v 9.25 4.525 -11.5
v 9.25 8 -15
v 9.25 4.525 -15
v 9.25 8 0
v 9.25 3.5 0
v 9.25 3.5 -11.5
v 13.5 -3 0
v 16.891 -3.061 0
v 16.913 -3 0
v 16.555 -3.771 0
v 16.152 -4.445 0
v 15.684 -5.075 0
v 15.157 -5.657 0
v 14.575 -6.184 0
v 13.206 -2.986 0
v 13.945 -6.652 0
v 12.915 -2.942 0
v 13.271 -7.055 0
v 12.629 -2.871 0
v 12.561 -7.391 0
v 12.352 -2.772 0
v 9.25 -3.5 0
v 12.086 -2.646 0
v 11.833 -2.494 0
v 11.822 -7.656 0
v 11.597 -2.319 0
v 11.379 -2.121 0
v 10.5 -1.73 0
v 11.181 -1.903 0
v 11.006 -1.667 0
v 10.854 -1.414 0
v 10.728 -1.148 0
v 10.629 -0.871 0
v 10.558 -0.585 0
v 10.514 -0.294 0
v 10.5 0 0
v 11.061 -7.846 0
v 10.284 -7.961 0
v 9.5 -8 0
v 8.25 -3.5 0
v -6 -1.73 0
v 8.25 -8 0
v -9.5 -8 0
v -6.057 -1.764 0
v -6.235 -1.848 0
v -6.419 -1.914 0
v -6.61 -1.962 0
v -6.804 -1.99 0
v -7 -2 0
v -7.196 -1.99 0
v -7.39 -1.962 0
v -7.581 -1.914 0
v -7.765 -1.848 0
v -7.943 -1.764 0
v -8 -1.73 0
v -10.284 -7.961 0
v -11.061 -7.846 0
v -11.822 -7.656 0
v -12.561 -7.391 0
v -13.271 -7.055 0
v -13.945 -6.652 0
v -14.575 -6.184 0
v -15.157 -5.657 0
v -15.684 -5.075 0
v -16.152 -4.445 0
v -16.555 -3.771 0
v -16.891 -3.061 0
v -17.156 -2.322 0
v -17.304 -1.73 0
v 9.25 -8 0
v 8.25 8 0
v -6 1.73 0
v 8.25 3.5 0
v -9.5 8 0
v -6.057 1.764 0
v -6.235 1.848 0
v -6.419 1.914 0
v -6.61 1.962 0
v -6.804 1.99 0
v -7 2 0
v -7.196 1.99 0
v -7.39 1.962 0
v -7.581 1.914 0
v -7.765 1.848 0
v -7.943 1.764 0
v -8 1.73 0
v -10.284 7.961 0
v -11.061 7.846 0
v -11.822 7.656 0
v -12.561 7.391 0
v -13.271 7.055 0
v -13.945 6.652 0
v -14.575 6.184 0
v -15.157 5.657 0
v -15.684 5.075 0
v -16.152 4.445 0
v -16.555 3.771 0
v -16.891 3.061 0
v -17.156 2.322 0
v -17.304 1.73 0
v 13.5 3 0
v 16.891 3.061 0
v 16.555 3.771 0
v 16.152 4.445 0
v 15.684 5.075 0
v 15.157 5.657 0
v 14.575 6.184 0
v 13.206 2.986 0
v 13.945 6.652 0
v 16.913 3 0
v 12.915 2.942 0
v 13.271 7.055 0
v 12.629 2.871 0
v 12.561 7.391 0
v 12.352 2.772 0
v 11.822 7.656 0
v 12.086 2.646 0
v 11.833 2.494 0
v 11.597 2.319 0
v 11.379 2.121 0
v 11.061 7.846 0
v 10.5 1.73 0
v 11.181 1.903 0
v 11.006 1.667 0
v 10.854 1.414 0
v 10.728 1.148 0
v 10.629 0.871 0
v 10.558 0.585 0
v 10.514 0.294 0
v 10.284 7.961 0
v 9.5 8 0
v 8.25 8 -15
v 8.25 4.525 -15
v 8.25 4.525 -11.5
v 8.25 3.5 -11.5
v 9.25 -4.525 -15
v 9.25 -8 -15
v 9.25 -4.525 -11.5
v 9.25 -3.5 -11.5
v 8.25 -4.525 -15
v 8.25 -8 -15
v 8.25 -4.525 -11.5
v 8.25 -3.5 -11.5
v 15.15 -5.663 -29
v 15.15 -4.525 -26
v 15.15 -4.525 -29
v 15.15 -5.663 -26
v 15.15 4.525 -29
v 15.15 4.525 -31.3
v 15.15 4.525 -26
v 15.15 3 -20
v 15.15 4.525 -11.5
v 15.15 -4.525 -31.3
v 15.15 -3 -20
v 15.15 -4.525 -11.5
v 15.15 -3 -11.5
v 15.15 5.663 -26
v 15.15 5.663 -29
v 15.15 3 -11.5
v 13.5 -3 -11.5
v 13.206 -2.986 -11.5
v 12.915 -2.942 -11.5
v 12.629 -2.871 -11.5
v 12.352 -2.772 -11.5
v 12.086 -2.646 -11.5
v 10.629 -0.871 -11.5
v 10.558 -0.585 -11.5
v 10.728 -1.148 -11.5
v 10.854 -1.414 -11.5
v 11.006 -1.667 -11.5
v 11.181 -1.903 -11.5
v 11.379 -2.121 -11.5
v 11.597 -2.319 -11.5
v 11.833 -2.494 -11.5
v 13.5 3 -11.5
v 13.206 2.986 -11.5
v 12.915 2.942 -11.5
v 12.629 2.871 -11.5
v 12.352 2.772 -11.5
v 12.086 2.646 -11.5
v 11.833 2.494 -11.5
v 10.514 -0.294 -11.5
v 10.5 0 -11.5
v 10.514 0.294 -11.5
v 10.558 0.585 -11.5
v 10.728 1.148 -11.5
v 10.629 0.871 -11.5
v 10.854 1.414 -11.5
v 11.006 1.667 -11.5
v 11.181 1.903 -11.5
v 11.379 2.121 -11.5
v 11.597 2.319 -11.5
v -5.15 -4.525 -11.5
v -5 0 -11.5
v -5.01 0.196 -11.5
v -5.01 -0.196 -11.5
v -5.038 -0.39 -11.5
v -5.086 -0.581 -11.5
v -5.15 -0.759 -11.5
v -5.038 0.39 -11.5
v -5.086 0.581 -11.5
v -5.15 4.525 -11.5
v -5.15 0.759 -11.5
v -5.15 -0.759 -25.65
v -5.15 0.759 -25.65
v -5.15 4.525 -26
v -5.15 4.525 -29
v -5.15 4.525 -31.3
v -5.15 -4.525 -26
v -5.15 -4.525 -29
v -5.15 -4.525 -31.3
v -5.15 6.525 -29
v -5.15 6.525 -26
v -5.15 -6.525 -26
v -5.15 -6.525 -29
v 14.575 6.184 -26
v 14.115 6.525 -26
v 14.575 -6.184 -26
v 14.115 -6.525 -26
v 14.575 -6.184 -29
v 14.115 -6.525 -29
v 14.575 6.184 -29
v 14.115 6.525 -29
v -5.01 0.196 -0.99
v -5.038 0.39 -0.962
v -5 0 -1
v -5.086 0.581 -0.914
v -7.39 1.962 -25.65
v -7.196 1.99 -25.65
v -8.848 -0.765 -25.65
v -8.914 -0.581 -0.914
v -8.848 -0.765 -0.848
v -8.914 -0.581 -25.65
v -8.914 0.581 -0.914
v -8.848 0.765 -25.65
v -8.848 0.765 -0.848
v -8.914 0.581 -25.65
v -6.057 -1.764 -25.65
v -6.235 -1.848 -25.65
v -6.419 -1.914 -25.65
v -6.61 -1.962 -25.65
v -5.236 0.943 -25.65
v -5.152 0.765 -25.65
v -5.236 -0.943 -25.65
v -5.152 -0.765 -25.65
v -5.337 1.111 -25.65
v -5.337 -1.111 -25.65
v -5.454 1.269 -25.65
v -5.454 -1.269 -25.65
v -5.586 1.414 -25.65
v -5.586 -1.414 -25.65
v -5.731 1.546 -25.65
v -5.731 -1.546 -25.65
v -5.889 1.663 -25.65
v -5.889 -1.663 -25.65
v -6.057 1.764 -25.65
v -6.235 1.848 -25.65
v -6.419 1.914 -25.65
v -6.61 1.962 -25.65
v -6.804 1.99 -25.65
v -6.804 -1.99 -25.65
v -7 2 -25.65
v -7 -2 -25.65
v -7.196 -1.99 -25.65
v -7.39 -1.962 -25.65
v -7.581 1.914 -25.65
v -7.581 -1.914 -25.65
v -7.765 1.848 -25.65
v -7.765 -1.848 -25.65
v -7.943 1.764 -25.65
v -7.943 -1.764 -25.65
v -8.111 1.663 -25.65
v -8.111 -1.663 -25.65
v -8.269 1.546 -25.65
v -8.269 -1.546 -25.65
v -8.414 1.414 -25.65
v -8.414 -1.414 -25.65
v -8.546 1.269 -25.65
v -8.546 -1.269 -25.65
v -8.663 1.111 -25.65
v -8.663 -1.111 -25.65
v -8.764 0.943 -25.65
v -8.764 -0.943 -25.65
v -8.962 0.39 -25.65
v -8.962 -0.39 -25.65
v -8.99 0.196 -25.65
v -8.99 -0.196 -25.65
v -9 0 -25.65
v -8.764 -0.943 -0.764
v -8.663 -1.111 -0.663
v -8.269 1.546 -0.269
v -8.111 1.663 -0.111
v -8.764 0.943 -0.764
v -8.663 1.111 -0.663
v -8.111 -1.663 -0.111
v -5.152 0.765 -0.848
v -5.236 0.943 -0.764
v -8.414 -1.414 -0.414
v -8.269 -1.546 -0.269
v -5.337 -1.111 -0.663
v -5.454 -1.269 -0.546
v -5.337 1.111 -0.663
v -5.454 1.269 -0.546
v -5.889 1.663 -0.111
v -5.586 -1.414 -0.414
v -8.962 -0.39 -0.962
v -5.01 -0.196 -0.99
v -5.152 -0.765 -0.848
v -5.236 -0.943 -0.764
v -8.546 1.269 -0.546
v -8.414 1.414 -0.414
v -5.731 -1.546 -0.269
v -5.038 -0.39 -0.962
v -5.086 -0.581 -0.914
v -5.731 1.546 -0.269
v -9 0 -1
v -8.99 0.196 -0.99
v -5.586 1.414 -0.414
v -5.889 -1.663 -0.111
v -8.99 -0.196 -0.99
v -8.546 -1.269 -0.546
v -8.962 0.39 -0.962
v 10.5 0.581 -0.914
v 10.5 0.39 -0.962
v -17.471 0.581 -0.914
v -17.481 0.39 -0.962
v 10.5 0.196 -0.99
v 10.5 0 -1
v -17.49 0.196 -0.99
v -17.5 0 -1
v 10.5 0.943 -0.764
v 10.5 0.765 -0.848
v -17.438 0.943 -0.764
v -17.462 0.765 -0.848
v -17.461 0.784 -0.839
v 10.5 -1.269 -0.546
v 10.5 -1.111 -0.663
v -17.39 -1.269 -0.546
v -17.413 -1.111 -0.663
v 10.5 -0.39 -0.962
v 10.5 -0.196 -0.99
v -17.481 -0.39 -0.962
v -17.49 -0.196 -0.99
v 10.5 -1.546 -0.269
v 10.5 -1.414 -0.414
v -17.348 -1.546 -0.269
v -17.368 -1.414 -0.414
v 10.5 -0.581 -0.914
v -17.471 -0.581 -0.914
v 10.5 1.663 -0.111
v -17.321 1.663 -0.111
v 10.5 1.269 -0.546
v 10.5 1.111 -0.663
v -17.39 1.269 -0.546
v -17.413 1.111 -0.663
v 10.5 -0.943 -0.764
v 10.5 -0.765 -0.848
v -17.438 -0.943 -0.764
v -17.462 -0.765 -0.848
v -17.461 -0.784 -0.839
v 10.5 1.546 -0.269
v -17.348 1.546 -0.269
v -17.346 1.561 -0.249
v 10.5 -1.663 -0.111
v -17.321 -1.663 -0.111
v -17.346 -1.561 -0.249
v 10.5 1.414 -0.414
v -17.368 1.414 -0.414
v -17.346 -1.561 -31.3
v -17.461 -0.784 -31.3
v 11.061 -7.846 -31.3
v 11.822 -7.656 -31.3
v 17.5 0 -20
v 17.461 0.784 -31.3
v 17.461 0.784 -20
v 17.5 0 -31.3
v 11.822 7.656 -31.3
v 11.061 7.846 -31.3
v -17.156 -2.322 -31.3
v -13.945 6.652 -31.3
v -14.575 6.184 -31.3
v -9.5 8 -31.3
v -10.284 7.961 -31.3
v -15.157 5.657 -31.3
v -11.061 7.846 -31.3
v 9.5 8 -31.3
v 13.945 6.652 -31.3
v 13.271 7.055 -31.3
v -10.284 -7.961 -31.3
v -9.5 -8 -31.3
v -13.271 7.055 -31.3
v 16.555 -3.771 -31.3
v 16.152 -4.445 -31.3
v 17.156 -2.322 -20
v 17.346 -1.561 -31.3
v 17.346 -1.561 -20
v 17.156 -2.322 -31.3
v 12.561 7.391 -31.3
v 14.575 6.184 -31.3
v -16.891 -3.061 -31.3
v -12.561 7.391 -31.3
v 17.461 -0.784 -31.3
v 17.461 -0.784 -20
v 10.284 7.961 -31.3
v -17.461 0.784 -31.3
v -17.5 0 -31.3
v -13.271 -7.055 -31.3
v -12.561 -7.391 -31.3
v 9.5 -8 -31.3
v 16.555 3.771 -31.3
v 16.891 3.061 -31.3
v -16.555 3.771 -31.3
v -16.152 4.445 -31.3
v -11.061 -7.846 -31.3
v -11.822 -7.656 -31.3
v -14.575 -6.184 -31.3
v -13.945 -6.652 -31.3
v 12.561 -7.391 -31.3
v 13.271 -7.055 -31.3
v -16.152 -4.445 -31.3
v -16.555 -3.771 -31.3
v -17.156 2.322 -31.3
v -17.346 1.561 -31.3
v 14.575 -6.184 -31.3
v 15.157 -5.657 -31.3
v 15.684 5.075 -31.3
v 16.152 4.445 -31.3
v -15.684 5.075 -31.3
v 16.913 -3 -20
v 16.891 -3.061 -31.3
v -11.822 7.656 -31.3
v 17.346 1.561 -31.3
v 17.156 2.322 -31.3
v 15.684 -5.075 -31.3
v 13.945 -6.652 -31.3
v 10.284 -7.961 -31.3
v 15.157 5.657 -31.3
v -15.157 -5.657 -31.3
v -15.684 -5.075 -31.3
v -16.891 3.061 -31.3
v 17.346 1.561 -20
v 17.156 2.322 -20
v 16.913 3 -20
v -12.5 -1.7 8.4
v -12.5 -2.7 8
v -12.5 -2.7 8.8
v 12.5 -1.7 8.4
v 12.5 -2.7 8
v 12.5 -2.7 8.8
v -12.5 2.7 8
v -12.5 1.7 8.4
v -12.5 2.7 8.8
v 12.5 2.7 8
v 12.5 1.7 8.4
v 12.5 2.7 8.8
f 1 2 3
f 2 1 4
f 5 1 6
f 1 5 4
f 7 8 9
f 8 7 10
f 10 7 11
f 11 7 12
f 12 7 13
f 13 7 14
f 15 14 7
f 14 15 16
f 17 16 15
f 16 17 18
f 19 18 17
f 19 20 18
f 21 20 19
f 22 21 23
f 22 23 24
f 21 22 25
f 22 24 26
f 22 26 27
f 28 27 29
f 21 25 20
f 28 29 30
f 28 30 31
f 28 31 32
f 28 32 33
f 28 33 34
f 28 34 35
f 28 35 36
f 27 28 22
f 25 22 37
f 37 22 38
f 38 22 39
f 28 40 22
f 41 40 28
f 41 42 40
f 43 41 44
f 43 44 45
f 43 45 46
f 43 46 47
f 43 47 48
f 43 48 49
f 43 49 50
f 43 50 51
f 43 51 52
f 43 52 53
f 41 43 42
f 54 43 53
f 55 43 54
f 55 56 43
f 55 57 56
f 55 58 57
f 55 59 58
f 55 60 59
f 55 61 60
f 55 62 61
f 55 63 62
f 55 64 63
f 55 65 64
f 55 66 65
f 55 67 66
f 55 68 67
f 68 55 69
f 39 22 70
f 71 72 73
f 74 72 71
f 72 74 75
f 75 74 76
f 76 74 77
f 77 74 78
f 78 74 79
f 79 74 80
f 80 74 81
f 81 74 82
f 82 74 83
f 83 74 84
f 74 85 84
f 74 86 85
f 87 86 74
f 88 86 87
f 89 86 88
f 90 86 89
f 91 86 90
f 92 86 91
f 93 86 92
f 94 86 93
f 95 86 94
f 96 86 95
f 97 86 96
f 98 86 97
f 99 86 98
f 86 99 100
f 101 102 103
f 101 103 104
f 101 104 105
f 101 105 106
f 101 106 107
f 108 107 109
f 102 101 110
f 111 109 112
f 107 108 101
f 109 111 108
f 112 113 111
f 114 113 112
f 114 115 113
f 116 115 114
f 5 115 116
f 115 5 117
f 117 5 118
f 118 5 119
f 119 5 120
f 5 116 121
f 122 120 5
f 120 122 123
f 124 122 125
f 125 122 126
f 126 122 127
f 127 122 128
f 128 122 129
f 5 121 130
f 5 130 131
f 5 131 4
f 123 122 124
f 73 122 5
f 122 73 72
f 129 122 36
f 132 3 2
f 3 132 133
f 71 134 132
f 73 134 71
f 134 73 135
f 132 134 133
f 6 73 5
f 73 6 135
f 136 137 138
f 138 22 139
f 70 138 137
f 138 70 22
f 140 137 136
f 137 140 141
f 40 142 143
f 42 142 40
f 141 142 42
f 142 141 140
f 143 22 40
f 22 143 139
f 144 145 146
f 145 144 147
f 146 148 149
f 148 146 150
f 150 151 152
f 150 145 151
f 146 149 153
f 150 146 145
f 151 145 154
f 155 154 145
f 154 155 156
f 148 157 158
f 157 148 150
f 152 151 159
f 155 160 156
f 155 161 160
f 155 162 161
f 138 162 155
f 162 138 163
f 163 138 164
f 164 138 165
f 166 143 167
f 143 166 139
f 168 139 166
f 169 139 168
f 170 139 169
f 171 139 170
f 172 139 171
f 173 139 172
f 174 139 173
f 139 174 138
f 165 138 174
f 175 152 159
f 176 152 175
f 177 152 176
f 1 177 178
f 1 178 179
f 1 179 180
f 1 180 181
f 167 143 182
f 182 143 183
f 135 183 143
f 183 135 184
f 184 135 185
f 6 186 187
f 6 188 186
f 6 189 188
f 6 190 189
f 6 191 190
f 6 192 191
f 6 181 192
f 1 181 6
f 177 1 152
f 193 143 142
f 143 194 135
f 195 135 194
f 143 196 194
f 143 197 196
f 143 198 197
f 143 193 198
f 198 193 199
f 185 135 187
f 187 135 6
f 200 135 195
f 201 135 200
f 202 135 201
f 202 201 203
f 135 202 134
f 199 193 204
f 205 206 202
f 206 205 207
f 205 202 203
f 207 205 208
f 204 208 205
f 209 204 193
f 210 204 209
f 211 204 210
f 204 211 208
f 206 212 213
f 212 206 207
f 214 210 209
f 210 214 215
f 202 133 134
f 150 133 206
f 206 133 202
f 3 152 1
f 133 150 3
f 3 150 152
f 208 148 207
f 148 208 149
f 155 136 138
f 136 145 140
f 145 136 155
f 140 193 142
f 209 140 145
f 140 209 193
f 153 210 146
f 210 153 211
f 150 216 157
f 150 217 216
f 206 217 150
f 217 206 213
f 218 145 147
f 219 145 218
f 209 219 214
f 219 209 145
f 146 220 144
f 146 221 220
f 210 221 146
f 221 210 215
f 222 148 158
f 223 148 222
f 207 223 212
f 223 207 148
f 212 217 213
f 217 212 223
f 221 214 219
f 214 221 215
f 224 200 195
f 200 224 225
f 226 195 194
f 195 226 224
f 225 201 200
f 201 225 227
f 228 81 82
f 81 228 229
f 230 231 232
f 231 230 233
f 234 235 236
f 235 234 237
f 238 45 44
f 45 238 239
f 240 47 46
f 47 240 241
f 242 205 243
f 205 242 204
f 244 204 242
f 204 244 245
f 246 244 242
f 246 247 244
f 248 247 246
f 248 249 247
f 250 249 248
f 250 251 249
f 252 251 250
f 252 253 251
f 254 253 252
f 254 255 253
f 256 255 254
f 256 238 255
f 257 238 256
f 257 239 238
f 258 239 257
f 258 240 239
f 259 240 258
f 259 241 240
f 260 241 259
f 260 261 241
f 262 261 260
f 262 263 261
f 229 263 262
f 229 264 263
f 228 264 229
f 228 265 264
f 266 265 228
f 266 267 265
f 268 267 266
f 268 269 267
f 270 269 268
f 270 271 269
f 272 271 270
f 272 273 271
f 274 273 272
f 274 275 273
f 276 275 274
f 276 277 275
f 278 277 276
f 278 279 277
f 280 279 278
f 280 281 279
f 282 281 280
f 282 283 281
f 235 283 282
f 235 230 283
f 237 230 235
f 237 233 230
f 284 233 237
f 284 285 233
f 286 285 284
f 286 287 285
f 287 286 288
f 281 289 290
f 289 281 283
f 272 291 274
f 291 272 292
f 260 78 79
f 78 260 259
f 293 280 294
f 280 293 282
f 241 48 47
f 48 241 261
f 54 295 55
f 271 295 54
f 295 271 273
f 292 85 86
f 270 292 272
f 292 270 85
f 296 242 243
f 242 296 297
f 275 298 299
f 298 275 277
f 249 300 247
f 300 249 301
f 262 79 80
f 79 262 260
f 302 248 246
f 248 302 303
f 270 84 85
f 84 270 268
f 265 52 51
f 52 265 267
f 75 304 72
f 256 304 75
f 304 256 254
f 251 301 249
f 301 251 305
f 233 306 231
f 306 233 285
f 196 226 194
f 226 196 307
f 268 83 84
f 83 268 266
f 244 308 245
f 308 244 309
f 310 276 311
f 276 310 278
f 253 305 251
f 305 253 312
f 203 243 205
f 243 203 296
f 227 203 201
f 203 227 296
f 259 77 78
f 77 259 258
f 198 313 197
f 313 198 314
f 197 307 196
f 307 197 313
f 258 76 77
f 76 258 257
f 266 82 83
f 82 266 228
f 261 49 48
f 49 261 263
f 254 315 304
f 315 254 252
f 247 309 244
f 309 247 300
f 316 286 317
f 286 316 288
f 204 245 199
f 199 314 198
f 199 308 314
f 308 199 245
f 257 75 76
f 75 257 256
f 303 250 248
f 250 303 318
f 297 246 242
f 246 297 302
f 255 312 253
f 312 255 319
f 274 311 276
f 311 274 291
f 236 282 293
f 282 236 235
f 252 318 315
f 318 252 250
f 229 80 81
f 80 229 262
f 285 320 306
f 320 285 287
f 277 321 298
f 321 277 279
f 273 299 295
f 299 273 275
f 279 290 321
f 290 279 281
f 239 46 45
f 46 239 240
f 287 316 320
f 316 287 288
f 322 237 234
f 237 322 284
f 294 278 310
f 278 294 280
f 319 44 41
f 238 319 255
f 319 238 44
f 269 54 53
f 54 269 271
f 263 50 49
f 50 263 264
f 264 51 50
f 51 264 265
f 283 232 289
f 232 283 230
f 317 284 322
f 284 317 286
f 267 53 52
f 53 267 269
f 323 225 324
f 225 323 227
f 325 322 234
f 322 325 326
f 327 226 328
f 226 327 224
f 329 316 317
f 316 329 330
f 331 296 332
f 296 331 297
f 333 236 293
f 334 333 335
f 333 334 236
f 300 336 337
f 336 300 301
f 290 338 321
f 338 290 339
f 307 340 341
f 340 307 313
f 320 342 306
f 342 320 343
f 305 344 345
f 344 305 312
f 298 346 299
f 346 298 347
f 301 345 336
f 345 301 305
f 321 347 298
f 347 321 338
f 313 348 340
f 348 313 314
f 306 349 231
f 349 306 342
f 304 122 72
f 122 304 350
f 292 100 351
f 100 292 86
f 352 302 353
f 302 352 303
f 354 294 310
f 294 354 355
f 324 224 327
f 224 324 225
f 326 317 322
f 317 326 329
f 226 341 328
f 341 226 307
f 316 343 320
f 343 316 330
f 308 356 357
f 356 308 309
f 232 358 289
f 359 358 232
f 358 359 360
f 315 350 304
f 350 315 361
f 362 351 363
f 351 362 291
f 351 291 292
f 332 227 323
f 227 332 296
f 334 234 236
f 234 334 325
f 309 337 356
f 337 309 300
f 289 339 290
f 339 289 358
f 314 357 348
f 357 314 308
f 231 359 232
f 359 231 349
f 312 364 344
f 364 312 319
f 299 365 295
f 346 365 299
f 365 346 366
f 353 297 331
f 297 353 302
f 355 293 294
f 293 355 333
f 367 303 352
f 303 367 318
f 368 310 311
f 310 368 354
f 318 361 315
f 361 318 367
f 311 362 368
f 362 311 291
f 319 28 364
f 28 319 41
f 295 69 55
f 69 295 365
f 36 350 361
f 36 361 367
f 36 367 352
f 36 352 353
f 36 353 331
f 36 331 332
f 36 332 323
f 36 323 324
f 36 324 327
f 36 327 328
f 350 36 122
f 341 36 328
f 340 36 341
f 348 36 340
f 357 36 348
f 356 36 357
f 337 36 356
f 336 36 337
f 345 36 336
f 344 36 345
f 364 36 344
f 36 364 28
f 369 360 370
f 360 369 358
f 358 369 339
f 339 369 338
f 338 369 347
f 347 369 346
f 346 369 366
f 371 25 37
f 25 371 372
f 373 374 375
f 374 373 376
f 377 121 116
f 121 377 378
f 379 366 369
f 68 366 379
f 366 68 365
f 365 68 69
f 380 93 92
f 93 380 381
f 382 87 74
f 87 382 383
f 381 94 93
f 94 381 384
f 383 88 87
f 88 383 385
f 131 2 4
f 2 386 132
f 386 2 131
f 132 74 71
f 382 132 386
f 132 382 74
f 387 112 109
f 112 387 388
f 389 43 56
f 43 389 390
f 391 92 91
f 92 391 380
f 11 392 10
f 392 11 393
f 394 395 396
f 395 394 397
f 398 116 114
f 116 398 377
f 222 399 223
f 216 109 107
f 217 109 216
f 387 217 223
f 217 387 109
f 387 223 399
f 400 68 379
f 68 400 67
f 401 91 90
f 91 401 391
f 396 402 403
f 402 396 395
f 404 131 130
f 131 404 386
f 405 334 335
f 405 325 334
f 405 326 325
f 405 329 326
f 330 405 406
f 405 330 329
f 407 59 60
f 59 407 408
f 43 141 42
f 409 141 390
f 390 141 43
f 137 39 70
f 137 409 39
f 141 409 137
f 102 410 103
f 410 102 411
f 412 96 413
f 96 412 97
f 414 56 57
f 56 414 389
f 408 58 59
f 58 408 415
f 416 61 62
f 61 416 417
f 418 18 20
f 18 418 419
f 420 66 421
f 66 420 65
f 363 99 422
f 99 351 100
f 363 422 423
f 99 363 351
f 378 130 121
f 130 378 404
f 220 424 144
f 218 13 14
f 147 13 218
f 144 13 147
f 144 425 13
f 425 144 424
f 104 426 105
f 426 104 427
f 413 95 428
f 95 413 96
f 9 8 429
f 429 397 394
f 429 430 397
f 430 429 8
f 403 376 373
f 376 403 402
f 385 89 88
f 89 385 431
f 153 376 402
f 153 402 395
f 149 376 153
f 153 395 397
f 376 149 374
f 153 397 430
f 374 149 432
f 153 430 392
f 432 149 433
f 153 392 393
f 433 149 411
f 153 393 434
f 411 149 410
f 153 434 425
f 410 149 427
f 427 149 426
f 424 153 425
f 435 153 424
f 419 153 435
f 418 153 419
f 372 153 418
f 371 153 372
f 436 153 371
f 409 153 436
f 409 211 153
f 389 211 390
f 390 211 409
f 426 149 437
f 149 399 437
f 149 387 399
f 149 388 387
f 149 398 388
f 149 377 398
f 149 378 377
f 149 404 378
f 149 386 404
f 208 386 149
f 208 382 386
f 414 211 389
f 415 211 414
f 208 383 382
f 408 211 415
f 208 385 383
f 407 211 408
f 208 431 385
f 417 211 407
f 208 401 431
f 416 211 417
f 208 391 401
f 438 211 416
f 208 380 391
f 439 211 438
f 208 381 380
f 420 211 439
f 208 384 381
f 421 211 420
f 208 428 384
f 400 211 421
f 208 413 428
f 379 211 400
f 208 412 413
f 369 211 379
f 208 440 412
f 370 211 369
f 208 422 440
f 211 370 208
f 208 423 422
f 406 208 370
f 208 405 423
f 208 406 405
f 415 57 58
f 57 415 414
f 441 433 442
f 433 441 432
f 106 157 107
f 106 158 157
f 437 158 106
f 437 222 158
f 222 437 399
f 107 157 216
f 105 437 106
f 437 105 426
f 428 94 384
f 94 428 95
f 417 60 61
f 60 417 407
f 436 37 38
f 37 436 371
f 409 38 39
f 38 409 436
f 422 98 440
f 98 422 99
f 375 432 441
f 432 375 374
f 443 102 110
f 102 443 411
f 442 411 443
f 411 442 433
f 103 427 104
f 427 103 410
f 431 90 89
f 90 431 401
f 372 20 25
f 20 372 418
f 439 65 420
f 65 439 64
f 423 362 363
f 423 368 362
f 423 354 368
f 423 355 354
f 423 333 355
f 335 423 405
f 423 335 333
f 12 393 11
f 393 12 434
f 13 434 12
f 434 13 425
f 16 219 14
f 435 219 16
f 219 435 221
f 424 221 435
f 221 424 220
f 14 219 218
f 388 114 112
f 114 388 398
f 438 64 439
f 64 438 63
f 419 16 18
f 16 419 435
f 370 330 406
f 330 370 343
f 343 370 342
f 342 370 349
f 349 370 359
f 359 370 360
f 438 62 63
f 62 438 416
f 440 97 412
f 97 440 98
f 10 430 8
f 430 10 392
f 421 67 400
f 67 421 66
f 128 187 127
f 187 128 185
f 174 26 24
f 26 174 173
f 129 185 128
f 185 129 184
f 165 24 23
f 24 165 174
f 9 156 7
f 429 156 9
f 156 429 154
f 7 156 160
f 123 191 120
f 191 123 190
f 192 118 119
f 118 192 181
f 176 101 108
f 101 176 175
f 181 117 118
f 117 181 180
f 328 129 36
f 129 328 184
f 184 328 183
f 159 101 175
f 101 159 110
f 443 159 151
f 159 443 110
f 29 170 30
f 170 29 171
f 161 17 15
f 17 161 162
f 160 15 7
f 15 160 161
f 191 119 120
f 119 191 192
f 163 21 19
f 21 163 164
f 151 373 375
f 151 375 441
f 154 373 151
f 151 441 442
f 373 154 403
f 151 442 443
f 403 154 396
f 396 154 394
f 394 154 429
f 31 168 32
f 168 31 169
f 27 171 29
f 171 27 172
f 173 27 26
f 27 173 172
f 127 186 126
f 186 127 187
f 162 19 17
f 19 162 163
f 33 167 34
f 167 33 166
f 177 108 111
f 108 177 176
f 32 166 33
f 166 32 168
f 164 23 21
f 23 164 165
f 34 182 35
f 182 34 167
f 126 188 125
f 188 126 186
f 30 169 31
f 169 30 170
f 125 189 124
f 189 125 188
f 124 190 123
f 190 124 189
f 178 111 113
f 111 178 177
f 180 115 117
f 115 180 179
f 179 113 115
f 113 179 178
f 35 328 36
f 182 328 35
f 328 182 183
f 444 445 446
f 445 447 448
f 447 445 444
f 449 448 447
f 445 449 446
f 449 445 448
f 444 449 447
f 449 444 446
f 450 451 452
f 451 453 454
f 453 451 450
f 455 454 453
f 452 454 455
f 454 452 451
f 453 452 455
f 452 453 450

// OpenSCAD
// file: config.scad
// config.scad - Central configuration for Rocket Fin Servo Mount System
// All dimensions in millimeters

// ============================================================================
// SERVO SPECIFICATIONS (3.7g Micro Servo)
// ============================================================================

servo_body_length = 20.0;      // X dimension
servo_body_width = 8.75;       // Y dimension
servo_body_height = 22.0;      // Z dimension (including gear case)
servo_tab_thickness = 2.0;     // Mounting tab thickness
servo_tab_extension = 2.0;     // How far tabs extend beyond body
servo_tab_height = 15.5;       // Height from bottom to tab underside
servo_shaft_diameter = 4.0;    // Output shaft diameter
servo_shaft_offset_x = 5.0;    // Shaft offset from body center (toward one end)
servo_shaft_offset_z = 2.0;    // Shaft height above body top
servo_cable_diameter = 3.0;    // Cable bundle diameter

// Clearances for servo pocket
servo_clearance = 0.3;         // Extra space around servo body

// ============================================================================
// FIN SPECIFICATIONS
// ============================================================================

fin_thickness = 4.0;           // Carbon fibre fin thickness
fin_slot_clearance = 0.2;      // Extra space in slot for easy insertion
fin_engagement_depth = 10.0;   // How deep fin inserts into mount

// ============================================================================
// AILERON SPECIFICATIONS
// ============================================================================

aileron_span = 50.0;           // Y dimension (along fin span)
aileron_chord = 25.0;          // X dimension (depth in flow direction)
aileron_thickness = 3.0;       // Z dimension (max thickness)
aileron_le_radius = 1.5;       // Leading edge radius (full round)
aileron_te_thickness = 0.5;    // Trailing edge minimum thickness
aileron_max_deflection = 30;   // Maximum deflection in degrees

// Hinge geometry
aileron_hinge_hole_dia = 2.0;  // For M2 pins
aileron_hinge_spacing = 40.0;  // Distance between hinge holes
aileron_hinge_offset = 2.0;    // Distance from leading edge to hinge center

// Servo interface
aileron_slot_width = 3.0;      // Width of adapter slot
aileron_slot_depth = 5.0;      // Depth of adapter slot

// ============================================================================
// SERVO MOUNT HOUSING
// ============================================================================

mount_wall_thickness = 2.0;    // Minimum wall thickness
mount_fairing_radius = 8.0;    // Rounding on leading/trailing edges
mount_total_length = 35.0;     // Overall X dimension
mount_total_width = 16.0;      // Overall Y dimension

// Calculated pocket dimensions (with clearances)
mount_pocket_length = servo_body_length + servo_clearance;
mount_pocket_width = servo_body_width + servo_clearance;
mount_pocket_height = servo_body_height + servo_clearance;

// Wire channel
wire_channel_diameter = 4.0;   // Diameter of cable routing channel

// Retention features
retention_barb_height = 0.8;   // Height of retention barbs
retention_barb_depth = 1.0;    // Depth of barb engagement

// ============================================================================
// SERVO ARM ADAPTER
// ============================================================================

adapter_horn_plate_dia = 7.0;  // Diameter of horn interface plate
adapter_horn_hole_dia = 1.5;   // Holes for horn screws
adapter_horn_hole_spacing = 4.0; // Spacing between horn holes (cross pattern)
adapter_post_height = 8.0;     // Height of connecting post
adapter_post_diameter = 3.0;   // Diameter of post
adapter_tab_width = 2.8;       // Width of aileron interface tab
adapter_tab_depth = 4.0;       // Depth of tab insertion
adapter_tab_height = 5.0;      // Height of tab

// ============================================================================
// HARDWARE
// ============================================================================

m2_hole_diameter = 2.2;        // Clearance hole for M2 screw
m2_tap_diameter = 1.8;         // Tap hole for M2 thread
hinge_pin_diameter = 2.0;      // M2 rod for hinge
hinge_pin_length = 12.0;       // Length of hinge pins

// ============================================================================
// RENDERING SETTINGS
// ============================================================================

$fn = 64;                      // Circle resolution for final renders
$fa = 2;                       // Minimum angle for arc segments
$fs = 0.5;                     // Minimum segment size

// Preview quality (use these for faster rendering during development)
preview_fn = 32;

// ============================================================================
// COLORS (for assembly visualization)
// ============================================================================

color_mount = [0.3, 0.3, 0.35];      // Dark grey
color_aileron = [0.9, 0.9, 0.95];    // Light grey/white
color_adapter = [0.2, 0.5, 0.8];     // Blue
color_servo = [0.1, 0.1, 0.15];      // Near black
color_fin = [0.15, 0.15, 0.15];      // Carbon black

// ============================================================================
// UTILITY FUNCTIONS
// ============================================================================

// Convert degrees to radians
function deg2rad(d) = d * PI / 180;

// Calculate hypotenuse
function hyp(a, b) = sqrt(a*a + b*b);
// main file
// servo_mount.scad - Servo mount housing that clamps to fin trailing edge
// Rocket Fin Servo Mount System

include <config.scad>

// ============================================================================
// MAIN MODULE
// ============================================================================

module servo_mount() {
    // Total height of mount below fin
    total_height = mount_pocket_height + mount_wall_thickness * 2 + 5;

    difference() {
        // Main body with aerodynamic fairing
        mount_body(total_height);

        // Fin slot
        fin_slot();

        // Servo pocket
        servo_pocket();

        // Wire channel
        wire_channel();

        // Servo mounting screw holes (optional)
        servo_screw_holes();

        // Shaft exit hole
        shaft_exit();

        // Hinge pin holes
        hinge_holes();
    }

    // Add retention barbs
    retention_barbs();
}

// ============================================================================
// SUB-MODULES
// ============================================================================

// Main aerodynamic body shape
module mount_body(height) {
    hull() {
        // Front rounded section
        translate([-mount_total_length/2 + mount_fairing_radius, 0, -height/2])
            cylinder(h = height, r = mount_fairing_radius, center = true);

        // Rear rounded section
        translate([mount_total_length/2 - mount_fairing_radius, 0, -height/2])
            cylinder(h = height, r = mount_fairing_radius, center = true);
    }
}

// Slot for fin trailing edge
module fin_slot() {
    slot_width = fin_thickness + fin_slot_clearance * 2;
    slot_length = mount_total_length;

    // Main slot
    translate([0, 0, fin_engagement_depth/2 + 0.01])
        cube([slot_length + 1, slot_width, fin_engagement_depth], center = true);

    // Entry chamfer (45 degrees)
    translate([0, 0, fin_engagement_depth + 1])
        hull() {
            cube([slot_length + 1, slot_width, 0.01], center = true);
            translate([0, 0, 2])
                cube([slot_length + 1, slot_width + 4, 0.01], center = true);
        }

    // Compliance slot (allows flex for clip action)
    compliance_depth = 15;
    translate([mount_total_length/4, mount_total_width/2 - 2, -compliance_depth/2])
        cube([1, 5, compliance_depth], center = true);
    translate([mount_total_length/4, -mount_total_width/2 + 2, -compliance_depth/2])
        cube([1, 5, compliance_depth], center = true);
}

// Pocket for servo body
module servo_pocket() {
    // Position: servo shaft should be at rear of mount, below fin
    pocket_z = -(mount_wall_thickness + mount_pocket_height/2) - fin_engagement_depth;

    // Main pocket
    translate([servo_shaft_offset_x, 0, pocket_z])
        cube([mount_pocket_length, mount_pocket_width, mount_pocket_height + 1], center = true);

    // Tab recesses (wider area at tab height)
    tab_recess_width = servo_body_width + servo_tab_extension * 2 + servo_clearance;
    tab_z = pocket_z + mount_pocket_height/2 - servo_tab_height;

    translate([servo_shaft_offset_x, 0, tab_z])
        cube([mount_pocket_length, tab_recess_width, servo_tab_thickness + 1], center = true);
}

// Channel for servo wire
module wire_channel() {
    // Runs from servo pocket up alongside fin slot
    pocket_z = -(mount_wall_thickness + mount_pocket_height/2) - fin_engagement_depth;

    // Vertical section
    translate([servo_shaft_offset_x - servo_body_length/2 - wire_channel_diameter/2,
               0,
               pocket_z/2])
        cylinder(h = abs(pocket_z) + 5, d = wire_channel_diameter, center = true);

    // Horizontal exit (alongside fin)
    translate([servo_shaft_offset_x - servo_body_length/2 - wire_channel_diameter/2,
               0,
               1])
        rotate([0, 90, 0])
            cylinder(h = mount_total_length, d = wire_channel_diameter, center = true);
}

// Optional servo mounting screw holes
module servo_screw_holes() {
    pocket_z = -(mount_wall_thickness + mount_pocket_height/2) - fin_engagement_depth;
    screw_z = pocket_z + mount_pocket_height/2 - servo_tab_height - servo_tab_thickness/2;

    // Screw positions (at ends of tabs)
    screw_x_offset = servo_body_length/2 - 3;  // Typical screw position

    for (x_sign = [-1, 1]) {
        translate([servo_shaft_offset_x + x_sign * screw_x_offset, 0, screw_z]) {
            // Through hole
            cylinder(h = 20, d = m2_hole_diameter, center = true);

            // Access from outside (countersink)
            translate([0, 0, -8])
                cylinder(h = 10, d = 4, center = true);
        }
    }
}

// Exit hole for servo output shaft
module shaft_exit() {
    // Shaft position
    shaft_x = servo_shaft_offset_x + servo_body_length/2 - servo_shaft_offset_x;
    pocket_z = -(mount_wall_thickness + mount_pocket_height/2) - fin_engagement_depth;
    shaft_z = pocket_z + mount_pocket_height/2 + servo_shaft_offset_z;

    // Elongated hole to allow shaft rotation clearance
    translate([mount_total_length/2 - mount_fairing_radius/2, 0, shaft_z])
        hull() {
            cylinder(h = 20, d = servo_shaft_diameter + 2, center = true);
            translate([5, 0, 0])
                cylinder(h = 20, d = servo_shaft_diameter + 2, center = true);
        }
}

// Hinge pin holes for aileron attachment
module hinge_holes() {
    pocket_z = -(mount_wall_thickness + mount_pocket_height/2) - fin_engagement_depth;
    shaft_z = pocket_z + mount_pocket_height/2 + servo_shaft_offset_z;

    // Holes at each end, aligned with aileron hinge
    for (y = [-aileron_hinge_spacing/2, aileron_hinge_spacing/2]) {
        translate([mount_total_length/2 + 2, y, shaft_z - 5])
            rotate([0, 90, 0])
                cylinder(h = 15, d = hinge_pin_diameter + 0.2, center = true);
    }
}

// Retention barbs for fin clamping
module retention_barbs() {
    barb_z = fin_engagement_depth - 2;
    slot_width = fin_thickness + fin_slot_clearance * 2;

    for (y_sign = [-1, 1]) {
        translate([0, y_sign * (slot_width/2 + retention_barb_depth/2), barb_z]) {
            // Small triangular barb
            rotate([0, 90, 0])
                linear_extrude(height = mount_total_length - 10, center = true)
                    polygon([
                        [0, 0],
                        [-retention_barb_height, 0],
                        [-retention_barb_height/2, -y_sign * retention_barb_depth]
                    ]);
        }
    }
}

// ============================================================================
// RENDER
// ============================================================================

// Render the mount
color(color_mount)
    servo_mount();

// Optional: Show servo for reference (comment out for STL export)
// %translate([servo_shaft_offset_x, 0, -(mount_wall_thickness + mount_pocket_height/2) - fin_engagement_depth])
//     cube([servo_body_length, servo_body_width, servo_body_height], center = true);
